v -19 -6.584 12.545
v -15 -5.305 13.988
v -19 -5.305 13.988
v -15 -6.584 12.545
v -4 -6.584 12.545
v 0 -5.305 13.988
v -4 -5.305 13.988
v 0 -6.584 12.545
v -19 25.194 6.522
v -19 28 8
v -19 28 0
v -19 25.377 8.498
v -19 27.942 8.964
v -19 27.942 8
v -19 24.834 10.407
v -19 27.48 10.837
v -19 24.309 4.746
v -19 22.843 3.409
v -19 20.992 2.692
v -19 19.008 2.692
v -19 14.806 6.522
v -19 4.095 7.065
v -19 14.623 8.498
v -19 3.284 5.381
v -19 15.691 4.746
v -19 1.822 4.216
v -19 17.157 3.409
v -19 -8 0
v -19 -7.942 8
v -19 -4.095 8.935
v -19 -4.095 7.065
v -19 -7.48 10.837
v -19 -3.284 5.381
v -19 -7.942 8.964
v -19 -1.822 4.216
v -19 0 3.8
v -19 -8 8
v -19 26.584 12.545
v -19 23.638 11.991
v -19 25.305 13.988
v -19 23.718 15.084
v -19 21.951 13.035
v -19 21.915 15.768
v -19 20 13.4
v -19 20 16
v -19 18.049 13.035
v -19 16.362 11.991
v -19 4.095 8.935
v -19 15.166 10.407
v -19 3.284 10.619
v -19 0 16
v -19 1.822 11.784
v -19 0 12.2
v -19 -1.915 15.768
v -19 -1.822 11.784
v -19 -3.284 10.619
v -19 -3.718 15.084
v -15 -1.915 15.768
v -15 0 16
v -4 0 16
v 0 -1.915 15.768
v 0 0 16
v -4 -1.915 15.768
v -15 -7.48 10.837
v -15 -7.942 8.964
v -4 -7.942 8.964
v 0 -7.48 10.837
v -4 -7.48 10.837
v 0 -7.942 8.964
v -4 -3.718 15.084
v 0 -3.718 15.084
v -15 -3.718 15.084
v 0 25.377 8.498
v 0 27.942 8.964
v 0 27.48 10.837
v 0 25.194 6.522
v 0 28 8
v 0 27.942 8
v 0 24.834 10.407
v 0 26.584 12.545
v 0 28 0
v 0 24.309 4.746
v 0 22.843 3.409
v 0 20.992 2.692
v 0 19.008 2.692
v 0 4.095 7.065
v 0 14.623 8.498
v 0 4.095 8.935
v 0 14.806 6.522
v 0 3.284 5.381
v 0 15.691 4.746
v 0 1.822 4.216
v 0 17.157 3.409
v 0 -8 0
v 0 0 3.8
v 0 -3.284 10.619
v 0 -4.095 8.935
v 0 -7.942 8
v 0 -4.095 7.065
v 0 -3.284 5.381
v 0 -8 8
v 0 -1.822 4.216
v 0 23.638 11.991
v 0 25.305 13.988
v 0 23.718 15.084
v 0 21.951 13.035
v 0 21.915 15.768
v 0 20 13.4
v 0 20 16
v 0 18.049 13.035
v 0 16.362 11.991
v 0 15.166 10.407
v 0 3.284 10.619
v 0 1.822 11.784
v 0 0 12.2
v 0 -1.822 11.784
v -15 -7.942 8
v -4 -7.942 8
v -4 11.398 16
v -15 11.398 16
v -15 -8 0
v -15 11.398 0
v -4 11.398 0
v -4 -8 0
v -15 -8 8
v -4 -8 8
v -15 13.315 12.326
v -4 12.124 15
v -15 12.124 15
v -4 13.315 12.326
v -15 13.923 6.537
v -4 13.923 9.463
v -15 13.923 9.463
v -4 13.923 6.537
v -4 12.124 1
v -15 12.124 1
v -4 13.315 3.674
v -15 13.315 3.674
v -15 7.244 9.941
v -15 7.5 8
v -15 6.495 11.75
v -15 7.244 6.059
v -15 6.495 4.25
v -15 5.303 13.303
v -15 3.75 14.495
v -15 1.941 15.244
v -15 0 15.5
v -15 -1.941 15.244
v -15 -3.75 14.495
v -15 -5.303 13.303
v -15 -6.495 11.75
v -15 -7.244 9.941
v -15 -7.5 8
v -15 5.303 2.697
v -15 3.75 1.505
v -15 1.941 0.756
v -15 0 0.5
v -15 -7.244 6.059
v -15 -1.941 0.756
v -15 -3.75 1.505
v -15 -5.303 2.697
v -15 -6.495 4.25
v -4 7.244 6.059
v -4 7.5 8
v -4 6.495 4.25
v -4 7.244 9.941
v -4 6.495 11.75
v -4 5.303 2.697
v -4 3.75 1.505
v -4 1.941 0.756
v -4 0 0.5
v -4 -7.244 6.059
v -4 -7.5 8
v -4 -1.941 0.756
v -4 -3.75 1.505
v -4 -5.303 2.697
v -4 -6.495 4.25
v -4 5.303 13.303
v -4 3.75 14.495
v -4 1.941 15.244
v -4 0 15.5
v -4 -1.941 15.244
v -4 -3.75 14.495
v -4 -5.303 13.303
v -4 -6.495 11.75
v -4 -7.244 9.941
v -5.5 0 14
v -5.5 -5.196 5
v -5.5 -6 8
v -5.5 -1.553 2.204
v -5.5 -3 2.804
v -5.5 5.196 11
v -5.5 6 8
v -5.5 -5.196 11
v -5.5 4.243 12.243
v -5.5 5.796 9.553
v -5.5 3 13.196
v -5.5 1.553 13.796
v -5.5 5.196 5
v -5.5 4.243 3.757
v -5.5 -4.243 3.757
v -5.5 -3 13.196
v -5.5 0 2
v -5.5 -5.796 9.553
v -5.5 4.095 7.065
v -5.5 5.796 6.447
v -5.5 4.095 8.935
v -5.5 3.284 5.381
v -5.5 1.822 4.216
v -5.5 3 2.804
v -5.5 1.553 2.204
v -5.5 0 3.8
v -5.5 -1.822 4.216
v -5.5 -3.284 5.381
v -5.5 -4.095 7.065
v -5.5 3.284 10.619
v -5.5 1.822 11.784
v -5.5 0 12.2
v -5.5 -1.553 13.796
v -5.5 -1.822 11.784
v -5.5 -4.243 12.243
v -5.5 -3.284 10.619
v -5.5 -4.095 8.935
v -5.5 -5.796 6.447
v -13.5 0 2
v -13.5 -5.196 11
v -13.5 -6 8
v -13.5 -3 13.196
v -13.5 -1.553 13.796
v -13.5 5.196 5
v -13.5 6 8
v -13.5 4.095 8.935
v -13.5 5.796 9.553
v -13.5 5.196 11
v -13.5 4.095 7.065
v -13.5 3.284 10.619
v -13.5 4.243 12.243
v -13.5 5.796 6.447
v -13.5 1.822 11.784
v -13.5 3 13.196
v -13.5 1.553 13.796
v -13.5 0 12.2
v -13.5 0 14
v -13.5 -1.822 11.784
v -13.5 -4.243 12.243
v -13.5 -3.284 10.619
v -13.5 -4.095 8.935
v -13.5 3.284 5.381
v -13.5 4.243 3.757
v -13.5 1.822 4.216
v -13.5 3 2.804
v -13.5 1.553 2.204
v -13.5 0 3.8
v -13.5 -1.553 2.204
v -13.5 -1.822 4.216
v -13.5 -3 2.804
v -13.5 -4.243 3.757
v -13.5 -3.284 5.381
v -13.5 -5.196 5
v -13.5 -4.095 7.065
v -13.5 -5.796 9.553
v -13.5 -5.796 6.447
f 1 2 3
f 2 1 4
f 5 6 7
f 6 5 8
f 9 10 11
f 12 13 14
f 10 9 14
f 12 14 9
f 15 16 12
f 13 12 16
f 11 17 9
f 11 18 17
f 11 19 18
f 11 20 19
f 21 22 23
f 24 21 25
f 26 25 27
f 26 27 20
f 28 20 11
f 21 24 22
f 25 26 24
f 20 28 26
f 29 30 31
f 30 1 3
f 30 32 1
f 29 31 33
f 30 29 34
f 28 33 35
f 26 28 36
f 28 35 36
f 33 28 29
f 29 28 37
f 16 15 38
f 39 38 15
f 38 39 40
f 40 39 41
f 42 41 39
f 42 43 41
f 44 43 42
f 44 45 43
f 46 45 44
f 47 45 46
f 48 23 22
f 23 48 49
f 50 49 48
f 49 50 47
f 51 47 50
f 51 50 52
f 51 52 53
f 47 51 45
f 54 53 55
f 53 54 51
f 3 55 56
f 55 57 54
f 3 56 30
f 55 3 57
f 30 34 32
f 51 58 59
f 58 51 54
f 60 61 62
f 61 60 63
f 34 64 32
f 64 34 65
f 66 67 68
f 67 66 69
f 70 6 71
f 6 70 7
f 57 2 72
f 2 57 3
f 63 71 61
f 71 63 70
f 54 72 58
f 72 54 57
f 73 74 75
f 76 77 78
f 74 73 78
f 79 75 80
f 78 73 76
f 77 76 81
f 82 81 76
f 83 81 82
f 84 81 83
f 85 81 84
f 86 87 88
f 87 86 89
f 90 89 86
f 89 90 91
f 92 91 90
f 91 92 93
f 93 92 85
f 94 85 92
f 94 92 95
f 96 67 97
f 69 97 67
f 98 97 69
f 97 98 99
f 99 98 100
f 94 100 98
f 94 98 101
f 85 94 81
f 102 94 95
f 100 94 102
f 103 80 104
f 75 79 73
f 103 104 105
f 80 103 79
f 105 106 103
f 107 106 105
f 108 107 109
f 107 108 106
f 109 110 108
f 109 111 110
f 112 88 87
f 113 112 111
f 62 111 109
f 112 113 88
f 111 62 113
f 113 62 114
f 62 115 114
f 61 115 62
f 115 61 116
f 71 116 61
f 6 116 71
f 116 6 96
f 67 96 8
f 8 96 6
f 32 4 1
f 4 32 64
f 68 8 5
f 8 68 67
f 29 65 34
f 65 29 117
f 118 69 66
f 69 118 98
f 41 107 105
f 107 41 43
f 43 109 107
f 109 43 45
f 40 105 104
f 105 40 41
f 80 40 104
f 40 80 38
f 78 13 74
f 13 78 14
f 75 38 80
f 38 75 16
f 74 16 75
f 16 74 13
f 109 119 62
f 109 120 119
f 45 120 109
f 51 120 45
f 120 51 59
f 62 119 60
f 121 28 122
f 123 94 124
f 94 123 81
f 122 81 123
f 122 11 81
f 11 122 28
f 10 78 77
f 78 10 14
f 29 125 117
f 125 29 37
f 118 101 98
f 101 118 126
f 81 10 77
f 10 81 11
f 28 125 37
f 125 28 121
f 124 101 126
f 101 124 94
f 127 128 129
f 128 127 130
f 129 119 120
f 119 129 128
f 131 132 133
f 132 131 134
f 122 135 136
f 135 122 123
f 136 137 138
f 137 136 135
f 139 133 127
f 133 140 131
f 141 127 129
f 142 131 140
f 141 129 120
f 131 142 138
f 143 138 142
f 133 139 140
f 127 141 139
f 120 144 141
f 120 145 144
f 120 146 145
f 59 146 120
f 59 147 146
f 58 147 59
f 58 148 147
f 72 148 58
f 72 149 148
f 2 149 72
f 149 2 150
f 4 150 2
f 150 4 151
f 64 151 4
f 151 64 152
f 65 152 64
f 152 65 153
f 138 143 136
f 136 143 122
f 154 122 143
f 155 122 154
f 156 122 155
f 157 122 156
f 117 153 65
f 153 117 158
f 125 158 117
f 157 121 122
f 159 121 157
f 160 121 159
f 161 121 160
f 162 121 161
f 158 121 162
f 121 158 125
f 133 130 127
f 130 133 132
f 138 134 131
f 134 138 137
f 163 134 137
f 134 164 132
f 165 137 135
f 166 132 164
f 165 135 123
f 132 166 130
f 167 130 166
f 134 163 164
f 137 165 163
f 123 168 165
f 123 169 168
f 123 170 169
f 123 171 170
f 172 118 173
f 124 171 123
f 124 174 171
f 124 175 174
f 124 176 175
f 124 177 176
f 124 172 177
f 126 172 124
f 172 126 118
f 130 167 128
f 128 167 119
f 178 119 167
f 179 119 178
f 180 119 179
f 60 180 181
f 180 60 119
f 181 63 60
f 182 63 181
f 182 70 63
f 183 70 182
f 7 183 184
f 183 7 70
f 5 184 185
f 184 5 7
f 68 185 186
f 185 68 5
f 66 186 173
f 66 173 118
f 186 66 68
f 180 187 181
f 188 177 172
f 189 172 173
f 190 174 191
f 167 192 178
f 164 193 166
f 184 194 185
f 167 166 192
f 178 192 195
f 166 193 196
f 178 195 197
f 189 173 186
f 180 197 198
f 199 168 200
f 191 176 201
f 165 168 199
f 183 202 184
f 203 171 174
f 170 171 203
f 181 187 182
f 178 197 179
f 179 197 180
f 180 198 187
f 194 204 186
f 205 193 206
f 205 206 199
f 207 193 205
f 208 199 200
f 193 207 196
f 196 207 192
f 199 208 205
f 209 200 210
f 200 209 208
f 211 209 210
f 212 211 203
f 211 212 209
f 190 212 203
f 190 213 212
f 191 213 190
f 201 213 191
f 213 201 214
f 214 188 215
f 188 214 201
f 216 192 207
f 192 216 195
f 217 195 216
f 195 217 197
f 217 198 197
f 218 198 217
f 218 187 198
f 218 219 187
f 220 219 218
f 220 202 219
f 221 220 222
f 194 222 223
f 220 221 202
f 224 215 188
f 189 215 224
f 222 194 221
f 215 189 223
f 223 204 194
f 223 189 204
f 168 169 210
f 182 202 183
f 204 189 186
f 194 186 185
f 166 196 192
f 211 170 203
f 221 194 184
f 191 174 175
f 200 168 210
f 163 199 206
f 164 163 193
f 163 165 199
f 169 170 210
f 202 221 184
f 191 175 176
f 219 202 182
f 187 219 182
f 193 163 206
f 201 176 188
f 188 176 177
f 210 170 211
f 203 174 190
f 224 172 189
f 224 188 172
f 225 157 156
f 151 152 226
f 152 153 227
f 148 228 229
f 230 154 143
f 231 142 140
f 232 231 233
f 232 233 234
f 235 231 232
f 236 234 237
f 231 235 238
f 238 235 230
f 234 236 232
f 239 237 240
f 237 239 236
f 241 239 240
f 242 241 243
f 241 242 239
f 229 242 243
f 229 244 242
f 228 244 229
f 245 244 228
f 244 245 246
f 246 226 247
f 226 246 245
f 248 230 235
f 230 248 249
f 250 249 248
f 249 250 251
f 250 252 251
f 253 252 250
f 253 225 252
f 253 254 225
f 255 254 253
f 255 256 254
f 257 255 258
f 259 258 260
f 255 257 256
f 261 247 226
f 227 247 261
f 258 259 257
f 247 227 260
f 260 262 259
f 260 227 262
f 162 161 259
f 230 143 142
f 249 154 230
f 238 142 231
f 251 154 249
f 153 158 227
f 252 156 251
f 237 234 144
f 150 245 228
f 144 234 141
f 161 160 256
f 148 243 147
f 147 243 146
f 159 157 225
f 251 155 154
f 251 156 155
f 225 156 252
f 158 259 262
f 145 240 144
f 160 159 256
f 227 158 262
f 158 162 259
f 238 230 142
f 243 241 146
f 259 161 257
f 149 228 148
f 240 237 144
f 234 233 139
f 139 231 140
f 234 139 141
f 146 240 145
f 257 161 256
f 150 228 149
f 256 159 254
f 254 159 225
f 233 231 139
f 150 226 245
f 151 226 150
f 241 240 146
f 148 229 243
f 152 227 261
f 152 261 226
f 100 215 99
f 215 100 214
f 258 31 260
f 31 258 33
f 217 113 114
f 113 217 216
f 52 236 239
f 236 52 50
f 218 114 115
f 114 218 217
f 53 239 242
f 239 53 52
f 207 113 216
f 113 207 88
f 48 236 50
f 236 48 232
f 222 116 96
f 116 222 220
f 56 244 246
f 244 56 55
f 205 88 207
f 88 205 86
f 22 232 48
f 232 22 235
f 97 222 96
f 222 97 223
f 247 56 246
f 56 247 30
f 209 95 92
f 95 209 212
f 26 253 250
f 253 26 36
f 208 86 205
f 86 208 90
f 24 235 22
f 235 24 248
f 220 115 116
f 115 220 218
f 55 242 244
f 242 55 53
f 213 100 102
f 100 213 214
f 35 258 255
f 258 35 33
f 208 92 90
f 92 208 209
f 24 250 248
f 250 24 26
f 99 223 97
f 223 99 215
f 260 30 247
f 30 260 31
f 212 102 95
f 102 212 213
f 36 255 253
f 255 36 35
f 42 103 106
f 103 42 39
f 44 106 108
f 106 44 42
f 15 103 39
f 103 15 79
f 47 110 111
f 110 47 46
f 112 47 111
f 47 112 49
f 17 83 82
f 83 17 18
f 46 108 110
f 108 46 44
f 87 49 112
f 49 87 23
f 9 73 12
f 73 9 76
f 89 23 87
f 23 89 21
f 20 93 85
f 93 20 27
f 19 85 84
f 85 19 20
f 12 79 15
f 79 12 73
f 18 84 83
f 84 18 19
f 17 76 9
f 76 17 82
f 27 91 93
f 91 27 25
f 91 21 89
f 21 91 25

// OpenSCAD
// PRUSA iteration3
// Y idler
// GNU GPL v3
// Josef Průša <iam@josefprusa.cz> and contributors
// http://www.reprap.org/wiki/Prusa_Mendel
// http://prusamendel.org


module y_idler_base(){
 translate(v = [0,0,0]) cylinder(h = 19, r=8);	
 translate(v = [0,20,0]) cylinder(h = 19, r=8);
 translate(v = [0,10,9.5]) cube(size = [16,20,19], center=true);
 translate(v = [-4,10,9.5]) cube(size = [8,16+20,19], center=true);
}

module y_idler_holes(){
 translate(v = [0,0,-1]) cylinder(h = 120, r=8.4/2);
 translate(v = [0,20,-1]) cylinder(h = 25, r=5.4);
 difference() {
   translate(v = [0,0,4]) cylinder(h = 11, r=22/2+3);

   // The fake bearing
   %translate([0,0,1+4+0.5]) cylinder(h = 8, r=(22/2)+2*0.66);

   // The two bumps around the center of the bearing
   translate([0,0,4]) cylinder(r1=15/2, r2=12/2,h=1.5);
   translate([0,0,9+6]) rotate([0,180,0]) cylinder(r1=15/2, r2=12/2,h=1.5);
}
}

// Final part
module y_idler(){
 translate(v = [0,0,8])rotate([0,-90,0]) difference(){
  y_idler_base();
  y_idler_holes();
 }
}

y_idler();
